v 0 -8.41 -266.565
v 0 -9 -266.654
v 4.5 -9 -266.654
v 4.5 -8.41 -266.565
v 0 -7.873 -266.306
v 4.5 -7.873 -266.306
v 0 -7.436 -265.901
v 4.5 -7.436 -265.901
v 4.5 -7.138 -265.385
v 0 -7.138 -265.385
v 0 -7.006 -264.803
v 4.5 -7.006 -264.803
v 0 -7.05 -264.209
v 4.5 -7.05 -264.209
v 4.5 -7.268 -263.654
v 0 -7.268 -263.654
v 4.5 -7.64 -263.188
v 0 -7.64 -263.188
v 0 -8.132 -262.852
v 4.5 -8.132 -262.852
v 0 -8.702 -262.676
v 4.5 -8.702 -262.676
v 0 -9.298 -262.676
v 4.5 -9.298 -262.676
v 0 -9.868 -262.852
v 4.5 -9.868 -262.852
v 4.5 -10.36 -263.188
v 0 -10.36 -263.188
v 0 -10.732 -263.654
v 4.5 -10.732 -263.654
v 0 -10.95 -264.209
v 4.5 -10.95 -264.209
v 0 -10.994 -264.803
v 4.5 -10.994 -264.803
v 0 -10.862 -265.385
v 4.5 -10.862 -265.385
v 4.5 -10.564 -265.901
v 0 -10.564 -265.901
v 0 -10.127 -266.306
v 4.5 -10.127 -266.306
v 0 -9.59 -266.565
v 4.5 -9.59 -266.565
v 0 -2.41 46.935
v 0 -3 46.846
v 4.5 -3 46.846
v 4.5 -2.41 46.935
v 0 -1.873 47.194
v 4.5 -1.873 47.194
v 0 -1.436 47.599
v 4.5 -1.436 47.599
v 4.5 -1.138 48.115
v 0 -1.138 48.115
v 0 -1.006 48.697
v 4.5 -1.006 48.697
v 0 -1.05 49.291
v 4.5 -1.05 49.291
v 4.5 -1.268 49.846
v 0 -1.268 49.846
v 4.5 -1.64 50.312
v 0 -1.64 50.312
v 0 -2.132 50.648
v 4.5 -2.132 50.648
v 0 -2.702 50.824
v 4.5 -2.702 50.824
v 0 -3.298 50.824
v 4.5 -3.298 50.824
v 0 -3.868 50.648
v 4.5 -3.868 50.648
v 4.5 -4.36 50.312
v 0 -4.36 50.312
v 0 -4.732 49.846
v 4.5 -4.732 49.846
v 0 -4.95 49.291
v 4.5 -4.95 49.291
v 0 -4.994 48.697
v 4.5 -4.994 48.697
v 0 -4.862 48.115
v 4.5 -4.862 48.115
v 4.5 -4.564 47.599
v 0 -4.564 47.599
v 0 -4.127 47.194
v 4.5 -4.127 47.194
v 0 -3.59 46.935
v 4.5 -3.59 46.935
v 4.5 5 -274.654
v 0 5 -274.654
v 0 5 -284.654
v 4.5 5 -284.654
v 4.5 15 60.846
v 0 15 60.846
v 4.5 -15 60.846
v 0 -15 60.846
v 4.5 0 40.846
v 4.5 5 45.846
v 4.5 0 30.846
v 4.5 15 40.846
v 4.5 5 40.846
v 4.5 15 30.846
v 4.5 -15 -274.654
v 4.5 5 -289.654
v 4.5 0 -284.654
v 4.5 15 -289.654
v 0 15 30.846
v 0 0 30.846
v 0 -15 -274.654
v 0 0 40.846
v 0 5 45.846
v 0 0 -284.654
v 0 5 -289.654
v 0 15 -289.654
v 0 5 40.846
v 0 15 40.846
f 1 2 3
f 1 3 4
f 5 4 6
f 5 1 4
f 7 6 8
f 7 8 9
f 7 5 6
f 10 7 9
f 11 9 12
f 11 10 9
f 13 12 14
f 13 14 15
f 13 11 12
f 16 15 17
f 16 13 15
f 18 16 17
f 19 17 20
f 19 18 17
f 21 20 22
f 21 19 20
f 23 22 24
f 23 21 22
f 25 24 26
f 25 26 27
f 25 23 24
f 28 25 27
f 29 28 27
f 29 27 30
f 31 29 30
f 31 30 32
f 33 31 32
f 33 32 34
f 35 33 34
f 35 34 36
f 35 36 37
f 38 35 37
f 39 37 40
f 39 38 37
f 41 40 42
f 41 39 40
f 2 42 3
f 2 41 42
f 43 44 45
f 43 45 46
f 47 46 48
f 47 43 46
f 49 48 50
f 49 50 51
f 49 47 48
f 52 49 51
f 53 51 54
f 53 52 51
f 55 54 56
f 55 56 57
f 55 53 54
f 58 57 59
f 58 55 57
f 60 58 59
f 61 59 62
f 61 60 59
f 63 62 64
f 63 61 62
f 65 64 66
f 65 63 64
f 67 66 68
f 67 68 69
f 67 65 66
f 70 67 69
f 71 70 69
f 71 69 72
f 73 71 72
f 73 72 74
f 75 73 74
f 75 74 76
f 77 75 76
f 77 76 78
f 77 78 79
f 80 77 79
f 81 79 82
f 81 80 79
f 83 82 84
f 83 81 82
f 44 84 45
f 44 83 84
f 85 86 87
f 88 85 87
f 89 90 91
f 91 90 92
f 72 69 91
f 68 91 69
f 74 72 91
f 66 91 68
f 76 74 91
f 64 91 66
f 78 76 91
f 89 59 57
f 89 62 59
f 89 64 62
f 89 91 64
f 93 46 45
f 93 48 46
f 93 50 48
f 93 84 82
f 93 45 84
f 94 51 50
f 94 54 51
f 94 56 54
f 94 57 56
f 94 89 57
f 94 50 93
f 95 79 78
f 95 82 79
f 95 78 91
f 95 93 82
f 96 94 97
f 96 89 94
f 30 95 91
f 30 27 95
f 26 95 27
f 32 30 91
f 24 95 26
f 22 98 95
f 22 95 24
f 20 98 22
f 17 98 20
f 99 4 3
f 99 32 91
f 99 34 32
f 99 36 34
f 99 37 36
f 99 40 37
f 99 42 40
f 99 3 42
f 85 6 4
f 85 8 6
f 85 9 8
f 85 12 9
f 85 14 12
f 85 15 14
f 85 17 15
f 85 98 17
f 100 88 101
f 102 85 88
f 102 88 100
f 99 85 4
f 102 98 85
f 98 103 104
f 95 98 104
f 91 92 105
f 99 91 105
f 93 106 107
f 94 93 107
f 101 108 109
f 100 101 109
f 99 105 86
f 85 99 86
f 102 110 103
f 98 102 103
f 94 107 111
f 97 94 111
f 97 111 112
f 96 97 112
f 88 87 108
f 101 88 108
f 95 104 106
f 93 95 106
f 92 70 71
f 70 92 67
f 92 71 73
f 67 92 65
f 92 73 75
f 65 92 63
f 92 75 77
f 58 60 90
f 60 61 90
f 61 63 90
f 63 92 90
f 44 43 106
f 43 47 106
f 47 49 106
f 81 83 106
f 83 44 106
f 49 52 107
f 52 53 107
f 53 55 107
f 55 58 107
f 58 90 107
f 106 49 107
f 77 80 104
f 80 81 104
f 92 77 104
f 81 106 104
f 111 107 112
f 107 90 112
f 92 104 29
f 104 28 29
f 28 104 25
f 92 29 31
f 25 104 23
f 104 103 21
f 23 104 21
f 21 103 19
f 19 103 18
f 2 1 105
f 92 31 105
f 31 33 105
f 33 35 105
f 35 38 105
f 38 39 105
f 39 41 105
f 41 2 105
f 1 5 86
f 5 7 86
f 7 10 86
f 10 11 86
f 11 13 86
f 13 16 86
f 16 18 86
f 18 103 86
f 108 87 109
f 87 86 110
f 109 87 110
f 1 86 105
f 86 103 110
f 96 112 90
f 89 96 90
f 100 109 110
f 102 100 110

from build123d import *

# Parameters (mm, degrees)
SKETCH1_R           = 2
BOSS_EXTRUDE1_DEPTH = 4.5


with BuildPart() as part:
    # Sketch1 → Boss-Extrude1 (new body)
    with BuildSketch(Plane(origin=(0, 0, 0), x_dir=(0, 0, -1), z_dir=(1, 0, 0))):
        Polygon((-30.84603871, 0), (-40.84603871, 0), (-45.84603871, 5), (-40.84603871, 5), (-40.84603871, 15), (-60.84603871, 15), (-60.84603871, -15), (274.65396129, -15), (274.65396129, 5), (284.65396129, 5), (284.65396129, 0), (289.65396129, 5), (289.65396129, 15), (274.65396129, 15), (-30.84603871, 15), align=None)
        with Locations((-48.84603871, -3)):
            Circle(SKETCH1_R, mode=Mode.SUBTRACT)
        with Locations((264.65396129, -9)):
            Circle(SKETCH1_R, mode=Mode.SUBTRACT)
    extrude(amount=BOSS_EXTRUDE1_DEPTH)


solid = part.part
